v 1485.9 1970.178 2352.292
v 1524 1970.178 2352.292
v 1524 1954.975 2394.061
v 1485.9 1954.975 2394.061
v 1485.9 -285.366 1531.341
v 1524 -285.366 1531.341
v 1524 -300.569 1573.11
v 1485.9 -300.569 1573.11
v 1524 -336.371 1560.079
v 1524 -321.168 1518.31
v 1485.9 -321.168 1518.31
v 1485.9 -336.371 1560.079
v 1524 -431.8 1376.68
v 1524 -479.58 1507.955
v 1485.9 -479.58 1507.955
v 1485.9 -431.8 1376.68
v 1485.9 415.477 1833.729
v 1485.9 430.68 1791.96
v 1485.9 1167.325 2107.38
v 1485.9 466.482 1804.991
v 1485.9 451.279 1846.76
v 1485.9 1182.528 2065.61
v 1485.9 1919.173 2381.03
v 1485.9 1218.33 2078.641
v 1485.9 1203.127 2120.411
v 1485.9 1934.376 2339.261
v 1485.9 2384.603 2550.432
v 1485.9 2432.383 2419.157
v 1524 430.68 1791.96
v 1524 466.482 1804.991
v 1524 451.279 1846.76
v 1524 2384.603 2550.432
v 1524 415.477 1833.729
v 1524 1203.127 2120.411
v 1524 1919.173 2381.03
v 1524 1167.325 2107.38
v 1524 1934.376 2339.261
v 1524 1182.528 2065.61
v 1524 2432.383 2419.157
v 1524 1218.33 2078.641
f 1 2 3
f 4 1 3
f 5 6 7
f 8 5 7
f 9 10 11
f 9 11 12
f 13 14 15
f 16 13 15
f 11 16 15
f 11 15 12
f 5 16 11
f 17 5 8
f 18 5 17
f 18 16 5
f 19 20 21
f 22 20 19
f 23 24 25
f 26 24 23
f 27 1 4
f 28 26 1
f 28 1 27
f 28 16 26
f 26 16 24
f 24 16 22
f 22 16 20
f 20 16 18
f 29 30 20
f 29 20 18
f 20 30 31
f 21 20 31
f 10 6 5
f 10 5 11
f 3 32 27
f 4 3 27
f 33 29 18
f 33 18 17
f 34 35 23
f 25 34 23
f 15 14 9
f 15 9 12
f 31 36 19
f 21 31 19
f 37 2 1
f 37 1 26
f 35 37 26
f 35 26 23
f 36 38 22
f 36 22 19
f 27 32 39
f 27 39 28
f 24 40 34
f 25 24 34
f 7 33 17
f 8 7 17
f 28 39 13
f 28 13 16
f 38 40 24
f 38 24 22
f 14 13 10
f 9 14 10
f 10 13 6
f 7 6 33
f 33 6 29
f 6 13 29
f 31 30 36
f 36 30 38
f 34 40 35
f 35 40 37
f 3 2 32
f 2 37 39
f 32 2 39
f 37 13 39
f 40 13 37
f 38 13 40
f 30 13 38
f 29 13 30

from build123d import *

# Parameters (mm, degrees)
BOX012_W               = 38.1
BOX012_H               = 3048
BOX012_DEPTH           = 139.7
BOX012_ROLL_ANGLE      = 20
SKETCH031_W            = 38.1
SKETCH031_H            = 44.45
POCKET022_DEPTH        = 38.1010000019
LINEARPATTERN002_COUNT = 4
LINEARPATTERN002_PITCH = 800.1


with BuildPart() as linearpattern002:
    # Box012 → Box012 (new body)
    with BuildSketch(Plane.XY):
        with Locations((19.05, 1524)):
            Rectangle(BOX012_W, BOX012_H)
    extrude(amount=BOX012_DEPTH)


with BuildPart() as linearpattern002_1:
    # Box012 roll: moved
    add(linearpattern002.part.rotate(Axis((0, 0, 0), (1, 0, 0)), BOX012_ROLL_ANGLE))


with BuildPart() as linearpattern002_2:
    # Box012 placement: moved
    add(linearpattern002_1.part.moved(Location((0, -431.8, 1376.68))))

    # Sketch031 → Pocket022 (cut, through all)
    with BuildSketch(Plane(origin=(0, -431.8, 1376.68), x_dir=(0, -0.9396926208, -0.3420201433), z_dir=(-1, 0, 0))):
        with Locations((-171.45, 117.475)):
            Rectangle(SKETCH031_W, SKETCH031_H)
    pocket022 = extrude(amount=-POCKET022_DEPTH, mode=Mode.SUBTRACT)

    # LinearPattern002: Pocket022 ×4
    with Locations(*[Vector(0, 0.9396926208, 0.3420201433) * (i * LINEARPATTERN002_PITCH) for i in range(1, LINEARPATTERN002_COUNT)]):
        add(pocket022, mode=Mode.SUBTRACT)


with BuildPart() as part_mirroring005:
    # Part__Mirroring005: instance of LinearPattern002
    add(linearpattern002_2.part.mirror(Plane(origin=(762, 0, 0), x_dir=(0, -1, 0), z_dir=(1, 0, 0))))


solid = part_mirroring005.part
